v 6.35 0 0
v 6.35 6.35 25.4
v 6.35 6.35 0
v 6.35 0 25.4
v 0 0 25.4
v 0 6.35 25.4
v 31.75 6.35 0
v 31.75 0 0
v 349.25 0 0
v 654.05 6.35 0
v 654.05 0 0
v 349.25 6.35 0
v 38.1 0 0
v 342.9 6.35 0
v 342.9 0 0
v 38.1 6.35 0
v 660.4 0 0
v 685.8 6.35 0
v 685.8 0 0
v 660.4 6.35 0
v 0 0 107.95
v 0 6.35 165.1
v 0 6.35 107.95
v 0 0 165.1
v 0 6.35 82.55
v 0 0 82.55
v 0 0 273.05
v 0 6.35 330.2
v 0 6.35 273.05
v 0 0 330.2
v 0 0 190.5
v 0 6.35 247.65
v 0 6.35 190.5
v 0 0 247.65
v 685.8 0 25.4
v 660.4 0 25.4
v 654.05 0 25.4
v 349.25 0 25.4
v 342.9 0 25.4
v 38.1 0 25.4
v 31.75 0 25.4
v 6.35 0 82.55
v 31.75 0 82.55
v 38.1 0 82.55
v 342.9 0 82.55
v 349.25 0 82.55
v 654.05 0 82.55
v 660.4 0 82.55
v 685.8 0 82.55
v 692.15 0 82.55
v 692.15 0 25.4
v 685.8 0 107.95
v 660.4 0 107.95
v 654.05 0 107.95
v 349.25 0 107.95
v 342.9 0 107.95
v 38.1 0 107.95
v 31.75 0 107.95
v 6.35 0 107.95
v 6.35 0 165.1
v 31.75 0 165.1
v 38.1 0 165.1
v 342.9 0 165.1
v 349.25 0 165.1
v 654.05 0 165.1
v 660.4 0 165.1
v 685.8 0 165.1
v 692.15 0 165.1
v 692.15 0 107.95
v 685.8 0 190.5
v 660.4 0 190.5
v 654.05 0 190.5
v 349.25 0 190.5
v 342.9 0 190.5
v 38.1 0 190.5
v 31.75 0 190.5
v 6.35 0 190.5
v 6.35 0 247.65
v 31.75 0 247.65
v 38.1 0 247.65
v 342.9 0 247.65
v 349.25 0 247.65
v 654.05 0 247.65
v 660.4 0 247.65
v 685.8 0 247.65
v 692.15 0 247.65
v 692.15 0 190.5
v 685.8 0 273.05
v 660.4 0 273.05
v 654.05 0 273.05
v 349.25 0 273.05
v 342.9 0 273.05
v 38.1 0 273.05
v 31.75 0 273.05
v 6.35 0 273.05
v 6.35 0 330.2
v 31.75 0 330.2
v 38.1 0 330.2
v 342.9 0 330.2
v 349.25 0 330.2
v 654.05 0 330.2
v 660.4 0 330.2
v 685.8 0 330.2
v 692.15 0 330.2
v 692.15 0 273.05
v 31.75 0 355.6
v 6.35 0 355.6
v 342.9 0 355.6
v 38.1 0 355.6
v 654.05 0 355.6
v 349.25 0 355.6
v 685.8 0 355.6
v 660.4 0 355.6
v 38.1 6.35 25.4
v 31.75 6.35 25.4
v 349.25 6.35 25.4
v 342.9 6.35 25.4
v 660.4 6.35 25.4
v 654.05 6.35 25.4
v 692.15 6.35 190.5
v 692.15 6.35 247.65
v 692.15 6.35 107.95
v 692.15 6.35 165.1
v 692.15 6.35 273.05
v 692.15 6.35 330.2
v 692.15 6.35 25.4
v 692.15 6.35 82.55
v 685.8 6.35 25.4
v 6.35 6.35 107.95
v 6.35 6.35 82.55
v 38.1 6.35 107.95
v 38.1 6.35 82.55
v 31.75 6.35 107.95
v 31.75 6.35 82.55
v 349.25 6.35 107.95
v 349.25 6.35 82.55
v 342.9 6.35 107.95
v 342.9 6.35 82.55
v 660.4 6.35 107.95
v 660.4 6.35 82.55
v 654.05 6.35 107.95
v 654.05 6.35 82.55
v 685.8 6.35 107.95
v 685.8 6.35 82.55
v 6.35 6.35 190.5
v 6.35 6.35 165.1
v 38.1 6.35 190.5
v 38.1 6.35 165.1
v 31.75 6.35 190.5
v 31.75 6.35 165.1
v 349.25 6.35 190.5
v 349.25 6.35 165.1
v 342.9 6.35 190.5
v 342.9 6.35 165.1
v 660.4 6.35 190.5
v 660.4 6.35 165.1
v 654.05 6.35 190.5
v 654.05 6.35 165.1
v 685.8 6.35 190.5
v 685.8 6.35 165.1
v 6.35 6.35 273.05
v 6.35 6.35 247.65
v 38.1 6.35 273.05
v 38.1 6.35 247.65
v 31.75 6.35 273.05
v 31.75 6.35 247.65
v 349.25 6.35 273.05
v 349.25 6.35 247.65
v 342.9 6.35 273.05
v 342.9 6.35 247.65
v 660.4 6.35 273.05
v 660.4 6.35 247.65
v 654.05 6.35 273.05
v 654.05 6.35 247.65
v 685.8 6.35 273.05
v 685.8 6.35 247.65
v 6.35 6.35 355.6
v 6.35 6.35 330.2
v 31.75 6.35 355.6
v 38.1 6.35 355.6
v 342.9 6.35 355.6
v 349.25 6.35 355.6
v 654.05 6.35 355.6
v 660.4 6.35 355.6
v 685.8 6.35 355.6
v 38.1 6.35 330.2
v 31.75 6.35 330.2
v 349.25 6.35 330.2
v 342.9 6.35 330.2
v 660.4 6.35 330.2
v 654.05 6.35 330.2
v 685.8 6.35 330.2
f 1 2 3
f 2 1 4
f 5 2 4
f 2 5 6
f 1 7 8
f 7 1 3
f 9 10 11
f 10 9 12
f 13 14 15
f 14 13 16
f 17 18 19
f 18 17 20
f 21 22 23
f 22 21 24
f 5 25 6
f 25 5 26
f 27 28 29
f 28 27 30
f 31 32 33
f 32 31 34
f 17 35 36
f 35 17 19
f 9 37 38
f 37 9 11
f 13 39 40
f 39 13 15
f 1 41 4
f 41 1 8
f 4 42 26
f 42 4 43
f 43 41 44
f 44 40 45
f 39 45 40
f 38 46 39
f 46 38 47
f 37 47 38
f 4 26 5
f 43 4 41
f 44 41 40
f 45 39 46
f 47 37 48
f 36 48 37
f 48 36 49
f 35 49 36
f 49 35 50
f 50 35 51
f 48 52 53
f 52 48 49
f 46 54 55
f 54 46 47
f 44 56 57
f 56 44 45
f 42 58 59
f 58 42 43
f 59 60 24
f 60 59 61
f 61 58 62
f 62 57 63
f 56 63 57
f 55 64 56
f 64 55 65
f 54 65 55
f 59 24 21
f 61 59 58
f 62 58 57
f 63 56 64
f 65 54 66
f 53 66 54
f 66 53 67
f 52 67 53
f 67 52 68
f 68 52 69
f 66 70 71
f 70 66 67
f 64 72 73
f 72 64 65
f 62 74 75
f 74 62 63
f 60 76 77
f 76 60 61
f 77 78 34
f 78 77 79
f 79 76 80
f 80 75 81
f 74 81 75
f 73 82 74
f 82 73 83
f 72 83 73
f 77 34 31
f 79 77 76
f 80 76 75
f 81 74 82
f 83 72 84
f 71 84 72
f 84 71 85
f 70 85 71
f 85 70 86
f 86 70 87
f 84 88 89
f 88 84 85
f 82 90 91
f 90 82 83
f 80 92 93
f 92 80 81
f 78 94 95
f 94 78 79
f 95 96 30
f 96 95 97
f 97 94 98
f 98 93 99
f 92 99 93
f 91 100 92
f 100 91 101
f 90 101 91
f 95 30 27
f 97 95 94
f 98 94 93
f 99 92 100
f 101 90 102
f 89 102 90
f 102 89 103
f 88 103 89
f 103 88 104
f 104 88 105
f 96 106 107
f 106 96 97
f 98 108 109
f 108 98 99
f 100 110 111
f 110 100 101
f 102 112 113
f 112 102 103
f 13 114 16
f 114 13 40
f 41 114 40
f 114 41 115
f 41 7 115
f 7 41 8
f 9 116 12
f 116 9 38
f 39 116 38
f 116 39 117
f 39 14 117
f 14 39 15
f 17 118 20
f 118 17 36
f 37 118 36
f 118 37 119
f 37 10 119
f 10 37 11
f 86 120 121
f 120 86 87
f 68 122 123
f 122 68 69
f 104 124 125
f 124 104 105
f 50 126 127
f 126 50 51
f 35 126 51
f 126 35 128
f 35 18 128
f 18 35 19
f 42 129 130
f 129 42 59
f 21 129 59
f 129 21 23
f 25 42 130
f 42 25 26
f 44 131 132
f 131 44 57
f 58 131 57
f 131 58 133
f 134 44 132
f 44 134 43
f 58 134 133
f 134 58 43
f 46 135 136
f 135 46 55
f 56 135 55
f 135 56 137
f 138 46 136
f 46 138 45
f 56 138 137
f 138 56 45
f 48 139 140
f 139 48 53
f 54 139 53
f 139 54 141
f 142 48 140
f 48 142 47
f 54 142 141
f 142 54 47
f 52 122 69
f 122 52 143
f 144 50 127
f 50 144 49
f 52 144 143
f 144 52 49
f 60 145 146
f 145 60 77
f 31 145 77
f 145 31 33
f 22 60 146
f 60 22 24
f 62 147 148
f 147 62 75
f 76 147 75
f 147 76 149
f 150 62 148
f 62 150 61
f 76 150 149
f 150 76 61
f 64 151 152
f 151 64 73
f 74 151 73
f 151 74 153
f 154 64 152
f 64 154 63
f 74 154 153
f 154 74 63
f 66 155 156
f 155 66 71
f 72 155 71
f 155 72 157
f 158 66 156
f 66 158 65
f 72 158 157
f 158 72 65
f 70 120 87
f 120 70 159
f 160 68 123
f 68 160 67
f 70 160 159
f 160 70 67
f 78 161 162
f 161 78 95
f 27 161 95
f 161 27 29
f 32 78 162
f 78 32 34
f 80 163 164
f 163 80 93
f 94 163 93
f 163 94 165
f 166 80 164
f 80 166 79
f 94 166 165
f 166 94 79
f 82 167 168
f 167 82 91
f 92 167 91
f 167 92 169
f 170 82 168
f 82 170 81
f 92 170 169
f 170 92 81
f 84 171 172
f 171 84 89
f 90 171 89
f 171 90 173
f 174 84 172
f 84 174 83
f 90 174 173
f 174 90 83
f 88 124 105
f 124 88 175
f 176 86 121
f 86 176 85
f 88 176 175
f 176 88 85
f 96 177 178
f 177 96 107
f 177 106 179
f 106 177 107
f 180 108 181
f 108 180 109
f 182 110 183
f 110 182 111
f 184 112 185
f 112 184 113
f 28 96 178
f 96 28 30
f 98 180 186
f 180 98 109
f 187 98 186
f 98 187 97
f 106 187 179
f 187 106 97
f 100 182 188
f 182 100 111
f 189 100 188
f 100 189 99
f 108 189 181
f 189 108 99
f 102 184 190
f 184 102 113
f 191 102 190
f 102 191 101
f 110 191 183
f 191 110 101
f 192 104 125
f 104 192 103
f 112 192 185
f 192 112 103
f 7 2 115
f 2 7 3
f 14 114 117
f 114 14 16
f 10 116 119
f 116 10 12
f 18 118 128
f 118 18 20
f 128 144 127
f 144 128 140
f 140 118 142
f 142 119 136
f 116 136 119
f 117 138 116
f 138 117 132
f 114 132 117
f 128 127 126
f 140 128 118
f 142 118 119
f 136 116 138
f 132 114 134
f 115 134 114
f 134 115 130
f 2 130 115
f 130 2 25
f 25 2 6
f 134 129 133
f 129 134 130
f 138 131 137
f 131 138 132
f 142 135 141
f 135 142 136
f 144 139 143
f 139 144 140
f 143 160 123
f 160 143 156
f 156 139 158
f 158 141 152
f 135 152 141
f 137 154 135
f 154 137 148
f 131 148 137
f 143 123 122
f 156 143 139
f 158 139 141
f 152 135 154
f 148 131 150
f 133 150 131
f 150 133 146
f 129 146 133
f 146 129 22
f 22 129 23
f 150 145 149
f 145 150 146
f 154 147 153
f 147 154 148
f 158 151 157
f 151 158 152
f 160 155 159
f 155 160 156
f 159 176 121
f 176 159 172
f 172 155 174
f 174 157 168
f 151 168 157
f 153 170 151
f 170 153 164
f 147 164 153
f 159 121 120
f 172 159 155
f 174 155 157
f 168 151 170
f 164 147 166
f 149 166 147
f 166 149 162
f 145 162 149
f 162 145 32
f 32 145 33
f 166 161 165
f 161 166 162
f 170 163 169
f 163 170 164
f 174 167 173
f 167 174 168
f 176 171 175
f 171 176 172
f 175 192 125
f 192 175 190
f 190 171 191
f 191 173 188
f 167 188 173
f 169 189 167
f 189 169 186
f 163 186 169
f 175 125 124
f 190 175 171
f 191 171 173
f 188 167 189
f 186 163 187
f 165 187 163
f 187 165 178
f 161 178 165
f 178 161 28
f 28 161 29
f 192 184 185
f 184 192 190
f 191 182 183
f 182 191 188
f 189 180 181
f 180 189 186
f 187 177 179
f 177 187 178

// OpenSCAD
/*
    this is a design for a powderbed printer
    
    Author: Phil Showers
    License: MIT or CC

*/

in2mm=25.4;

materialThickness=in2mm/4;
spillGap = in2mm;
tabZ = in2mm;
printEnvelope = [12*in2mm, 12*in2mm, 14*in2mm];

//translate([spillGap+materialThickness*2,0,0])cube(printEnvelope);
//translate([printEnvelope.x+materialThickness*3+spillGap,0,0])cube(printEnvelope);

module frontAndBackPart()
{
    difference()
    {
        cube([printEnvelope.x*2+materialThickness*5+spillGap*2, materialThickness, printEnvelope.z]);
    
        for (zOffset =[0:(printEnvelope.z-tabZ)/4:printEnvelope.z])
        {
            //left side
            translate([0,0,zOffset])
                cube([materialThickness, tabZ, tabZ]);
            
            //left spillgap
            translate([spillGap+materialThickness,0,zOffset])
                cube([materialThickness, tabZ, tabZ]);
            
            
            //ceter
            translate([printEnvelope.x+materialThickness*2+spillGap,0,zOffset])
                cube([materialThickness, tabZ, tabZ]);
            
            
            //right spillgap
            translate([printEnvelope.x*2+materialThickness*3+spillGap,0,zOffset])
                cube([materialThickness, tabZ, tabZ]);
            
            //right side
            translate([printEnvelope.x*2+materialThickness*4+spillGap*2,0,zOffset])
                cube([materialThickness, tabZ, tabZ]);
            
        }
    }
}

frontAndBackPart();


module side()
{
    
    translate([0,materialThickness,0])
        cube([materialThickness, printEnvelope.y, printEnvelope.z]);
    
    for (zOffset =[0:(printEnvelope.z-tabZ)/4:printEnvelope.z])
    {
        translate([0,0,zOffset])
            cube([materialThickness, tabZ, tabZ]);
        translate([0,printEnvelope.y-tabZ+materialThickness*2,zOffset])
            cube([materialThickness, tabZ, tabZ]);
    }
}

//side();
